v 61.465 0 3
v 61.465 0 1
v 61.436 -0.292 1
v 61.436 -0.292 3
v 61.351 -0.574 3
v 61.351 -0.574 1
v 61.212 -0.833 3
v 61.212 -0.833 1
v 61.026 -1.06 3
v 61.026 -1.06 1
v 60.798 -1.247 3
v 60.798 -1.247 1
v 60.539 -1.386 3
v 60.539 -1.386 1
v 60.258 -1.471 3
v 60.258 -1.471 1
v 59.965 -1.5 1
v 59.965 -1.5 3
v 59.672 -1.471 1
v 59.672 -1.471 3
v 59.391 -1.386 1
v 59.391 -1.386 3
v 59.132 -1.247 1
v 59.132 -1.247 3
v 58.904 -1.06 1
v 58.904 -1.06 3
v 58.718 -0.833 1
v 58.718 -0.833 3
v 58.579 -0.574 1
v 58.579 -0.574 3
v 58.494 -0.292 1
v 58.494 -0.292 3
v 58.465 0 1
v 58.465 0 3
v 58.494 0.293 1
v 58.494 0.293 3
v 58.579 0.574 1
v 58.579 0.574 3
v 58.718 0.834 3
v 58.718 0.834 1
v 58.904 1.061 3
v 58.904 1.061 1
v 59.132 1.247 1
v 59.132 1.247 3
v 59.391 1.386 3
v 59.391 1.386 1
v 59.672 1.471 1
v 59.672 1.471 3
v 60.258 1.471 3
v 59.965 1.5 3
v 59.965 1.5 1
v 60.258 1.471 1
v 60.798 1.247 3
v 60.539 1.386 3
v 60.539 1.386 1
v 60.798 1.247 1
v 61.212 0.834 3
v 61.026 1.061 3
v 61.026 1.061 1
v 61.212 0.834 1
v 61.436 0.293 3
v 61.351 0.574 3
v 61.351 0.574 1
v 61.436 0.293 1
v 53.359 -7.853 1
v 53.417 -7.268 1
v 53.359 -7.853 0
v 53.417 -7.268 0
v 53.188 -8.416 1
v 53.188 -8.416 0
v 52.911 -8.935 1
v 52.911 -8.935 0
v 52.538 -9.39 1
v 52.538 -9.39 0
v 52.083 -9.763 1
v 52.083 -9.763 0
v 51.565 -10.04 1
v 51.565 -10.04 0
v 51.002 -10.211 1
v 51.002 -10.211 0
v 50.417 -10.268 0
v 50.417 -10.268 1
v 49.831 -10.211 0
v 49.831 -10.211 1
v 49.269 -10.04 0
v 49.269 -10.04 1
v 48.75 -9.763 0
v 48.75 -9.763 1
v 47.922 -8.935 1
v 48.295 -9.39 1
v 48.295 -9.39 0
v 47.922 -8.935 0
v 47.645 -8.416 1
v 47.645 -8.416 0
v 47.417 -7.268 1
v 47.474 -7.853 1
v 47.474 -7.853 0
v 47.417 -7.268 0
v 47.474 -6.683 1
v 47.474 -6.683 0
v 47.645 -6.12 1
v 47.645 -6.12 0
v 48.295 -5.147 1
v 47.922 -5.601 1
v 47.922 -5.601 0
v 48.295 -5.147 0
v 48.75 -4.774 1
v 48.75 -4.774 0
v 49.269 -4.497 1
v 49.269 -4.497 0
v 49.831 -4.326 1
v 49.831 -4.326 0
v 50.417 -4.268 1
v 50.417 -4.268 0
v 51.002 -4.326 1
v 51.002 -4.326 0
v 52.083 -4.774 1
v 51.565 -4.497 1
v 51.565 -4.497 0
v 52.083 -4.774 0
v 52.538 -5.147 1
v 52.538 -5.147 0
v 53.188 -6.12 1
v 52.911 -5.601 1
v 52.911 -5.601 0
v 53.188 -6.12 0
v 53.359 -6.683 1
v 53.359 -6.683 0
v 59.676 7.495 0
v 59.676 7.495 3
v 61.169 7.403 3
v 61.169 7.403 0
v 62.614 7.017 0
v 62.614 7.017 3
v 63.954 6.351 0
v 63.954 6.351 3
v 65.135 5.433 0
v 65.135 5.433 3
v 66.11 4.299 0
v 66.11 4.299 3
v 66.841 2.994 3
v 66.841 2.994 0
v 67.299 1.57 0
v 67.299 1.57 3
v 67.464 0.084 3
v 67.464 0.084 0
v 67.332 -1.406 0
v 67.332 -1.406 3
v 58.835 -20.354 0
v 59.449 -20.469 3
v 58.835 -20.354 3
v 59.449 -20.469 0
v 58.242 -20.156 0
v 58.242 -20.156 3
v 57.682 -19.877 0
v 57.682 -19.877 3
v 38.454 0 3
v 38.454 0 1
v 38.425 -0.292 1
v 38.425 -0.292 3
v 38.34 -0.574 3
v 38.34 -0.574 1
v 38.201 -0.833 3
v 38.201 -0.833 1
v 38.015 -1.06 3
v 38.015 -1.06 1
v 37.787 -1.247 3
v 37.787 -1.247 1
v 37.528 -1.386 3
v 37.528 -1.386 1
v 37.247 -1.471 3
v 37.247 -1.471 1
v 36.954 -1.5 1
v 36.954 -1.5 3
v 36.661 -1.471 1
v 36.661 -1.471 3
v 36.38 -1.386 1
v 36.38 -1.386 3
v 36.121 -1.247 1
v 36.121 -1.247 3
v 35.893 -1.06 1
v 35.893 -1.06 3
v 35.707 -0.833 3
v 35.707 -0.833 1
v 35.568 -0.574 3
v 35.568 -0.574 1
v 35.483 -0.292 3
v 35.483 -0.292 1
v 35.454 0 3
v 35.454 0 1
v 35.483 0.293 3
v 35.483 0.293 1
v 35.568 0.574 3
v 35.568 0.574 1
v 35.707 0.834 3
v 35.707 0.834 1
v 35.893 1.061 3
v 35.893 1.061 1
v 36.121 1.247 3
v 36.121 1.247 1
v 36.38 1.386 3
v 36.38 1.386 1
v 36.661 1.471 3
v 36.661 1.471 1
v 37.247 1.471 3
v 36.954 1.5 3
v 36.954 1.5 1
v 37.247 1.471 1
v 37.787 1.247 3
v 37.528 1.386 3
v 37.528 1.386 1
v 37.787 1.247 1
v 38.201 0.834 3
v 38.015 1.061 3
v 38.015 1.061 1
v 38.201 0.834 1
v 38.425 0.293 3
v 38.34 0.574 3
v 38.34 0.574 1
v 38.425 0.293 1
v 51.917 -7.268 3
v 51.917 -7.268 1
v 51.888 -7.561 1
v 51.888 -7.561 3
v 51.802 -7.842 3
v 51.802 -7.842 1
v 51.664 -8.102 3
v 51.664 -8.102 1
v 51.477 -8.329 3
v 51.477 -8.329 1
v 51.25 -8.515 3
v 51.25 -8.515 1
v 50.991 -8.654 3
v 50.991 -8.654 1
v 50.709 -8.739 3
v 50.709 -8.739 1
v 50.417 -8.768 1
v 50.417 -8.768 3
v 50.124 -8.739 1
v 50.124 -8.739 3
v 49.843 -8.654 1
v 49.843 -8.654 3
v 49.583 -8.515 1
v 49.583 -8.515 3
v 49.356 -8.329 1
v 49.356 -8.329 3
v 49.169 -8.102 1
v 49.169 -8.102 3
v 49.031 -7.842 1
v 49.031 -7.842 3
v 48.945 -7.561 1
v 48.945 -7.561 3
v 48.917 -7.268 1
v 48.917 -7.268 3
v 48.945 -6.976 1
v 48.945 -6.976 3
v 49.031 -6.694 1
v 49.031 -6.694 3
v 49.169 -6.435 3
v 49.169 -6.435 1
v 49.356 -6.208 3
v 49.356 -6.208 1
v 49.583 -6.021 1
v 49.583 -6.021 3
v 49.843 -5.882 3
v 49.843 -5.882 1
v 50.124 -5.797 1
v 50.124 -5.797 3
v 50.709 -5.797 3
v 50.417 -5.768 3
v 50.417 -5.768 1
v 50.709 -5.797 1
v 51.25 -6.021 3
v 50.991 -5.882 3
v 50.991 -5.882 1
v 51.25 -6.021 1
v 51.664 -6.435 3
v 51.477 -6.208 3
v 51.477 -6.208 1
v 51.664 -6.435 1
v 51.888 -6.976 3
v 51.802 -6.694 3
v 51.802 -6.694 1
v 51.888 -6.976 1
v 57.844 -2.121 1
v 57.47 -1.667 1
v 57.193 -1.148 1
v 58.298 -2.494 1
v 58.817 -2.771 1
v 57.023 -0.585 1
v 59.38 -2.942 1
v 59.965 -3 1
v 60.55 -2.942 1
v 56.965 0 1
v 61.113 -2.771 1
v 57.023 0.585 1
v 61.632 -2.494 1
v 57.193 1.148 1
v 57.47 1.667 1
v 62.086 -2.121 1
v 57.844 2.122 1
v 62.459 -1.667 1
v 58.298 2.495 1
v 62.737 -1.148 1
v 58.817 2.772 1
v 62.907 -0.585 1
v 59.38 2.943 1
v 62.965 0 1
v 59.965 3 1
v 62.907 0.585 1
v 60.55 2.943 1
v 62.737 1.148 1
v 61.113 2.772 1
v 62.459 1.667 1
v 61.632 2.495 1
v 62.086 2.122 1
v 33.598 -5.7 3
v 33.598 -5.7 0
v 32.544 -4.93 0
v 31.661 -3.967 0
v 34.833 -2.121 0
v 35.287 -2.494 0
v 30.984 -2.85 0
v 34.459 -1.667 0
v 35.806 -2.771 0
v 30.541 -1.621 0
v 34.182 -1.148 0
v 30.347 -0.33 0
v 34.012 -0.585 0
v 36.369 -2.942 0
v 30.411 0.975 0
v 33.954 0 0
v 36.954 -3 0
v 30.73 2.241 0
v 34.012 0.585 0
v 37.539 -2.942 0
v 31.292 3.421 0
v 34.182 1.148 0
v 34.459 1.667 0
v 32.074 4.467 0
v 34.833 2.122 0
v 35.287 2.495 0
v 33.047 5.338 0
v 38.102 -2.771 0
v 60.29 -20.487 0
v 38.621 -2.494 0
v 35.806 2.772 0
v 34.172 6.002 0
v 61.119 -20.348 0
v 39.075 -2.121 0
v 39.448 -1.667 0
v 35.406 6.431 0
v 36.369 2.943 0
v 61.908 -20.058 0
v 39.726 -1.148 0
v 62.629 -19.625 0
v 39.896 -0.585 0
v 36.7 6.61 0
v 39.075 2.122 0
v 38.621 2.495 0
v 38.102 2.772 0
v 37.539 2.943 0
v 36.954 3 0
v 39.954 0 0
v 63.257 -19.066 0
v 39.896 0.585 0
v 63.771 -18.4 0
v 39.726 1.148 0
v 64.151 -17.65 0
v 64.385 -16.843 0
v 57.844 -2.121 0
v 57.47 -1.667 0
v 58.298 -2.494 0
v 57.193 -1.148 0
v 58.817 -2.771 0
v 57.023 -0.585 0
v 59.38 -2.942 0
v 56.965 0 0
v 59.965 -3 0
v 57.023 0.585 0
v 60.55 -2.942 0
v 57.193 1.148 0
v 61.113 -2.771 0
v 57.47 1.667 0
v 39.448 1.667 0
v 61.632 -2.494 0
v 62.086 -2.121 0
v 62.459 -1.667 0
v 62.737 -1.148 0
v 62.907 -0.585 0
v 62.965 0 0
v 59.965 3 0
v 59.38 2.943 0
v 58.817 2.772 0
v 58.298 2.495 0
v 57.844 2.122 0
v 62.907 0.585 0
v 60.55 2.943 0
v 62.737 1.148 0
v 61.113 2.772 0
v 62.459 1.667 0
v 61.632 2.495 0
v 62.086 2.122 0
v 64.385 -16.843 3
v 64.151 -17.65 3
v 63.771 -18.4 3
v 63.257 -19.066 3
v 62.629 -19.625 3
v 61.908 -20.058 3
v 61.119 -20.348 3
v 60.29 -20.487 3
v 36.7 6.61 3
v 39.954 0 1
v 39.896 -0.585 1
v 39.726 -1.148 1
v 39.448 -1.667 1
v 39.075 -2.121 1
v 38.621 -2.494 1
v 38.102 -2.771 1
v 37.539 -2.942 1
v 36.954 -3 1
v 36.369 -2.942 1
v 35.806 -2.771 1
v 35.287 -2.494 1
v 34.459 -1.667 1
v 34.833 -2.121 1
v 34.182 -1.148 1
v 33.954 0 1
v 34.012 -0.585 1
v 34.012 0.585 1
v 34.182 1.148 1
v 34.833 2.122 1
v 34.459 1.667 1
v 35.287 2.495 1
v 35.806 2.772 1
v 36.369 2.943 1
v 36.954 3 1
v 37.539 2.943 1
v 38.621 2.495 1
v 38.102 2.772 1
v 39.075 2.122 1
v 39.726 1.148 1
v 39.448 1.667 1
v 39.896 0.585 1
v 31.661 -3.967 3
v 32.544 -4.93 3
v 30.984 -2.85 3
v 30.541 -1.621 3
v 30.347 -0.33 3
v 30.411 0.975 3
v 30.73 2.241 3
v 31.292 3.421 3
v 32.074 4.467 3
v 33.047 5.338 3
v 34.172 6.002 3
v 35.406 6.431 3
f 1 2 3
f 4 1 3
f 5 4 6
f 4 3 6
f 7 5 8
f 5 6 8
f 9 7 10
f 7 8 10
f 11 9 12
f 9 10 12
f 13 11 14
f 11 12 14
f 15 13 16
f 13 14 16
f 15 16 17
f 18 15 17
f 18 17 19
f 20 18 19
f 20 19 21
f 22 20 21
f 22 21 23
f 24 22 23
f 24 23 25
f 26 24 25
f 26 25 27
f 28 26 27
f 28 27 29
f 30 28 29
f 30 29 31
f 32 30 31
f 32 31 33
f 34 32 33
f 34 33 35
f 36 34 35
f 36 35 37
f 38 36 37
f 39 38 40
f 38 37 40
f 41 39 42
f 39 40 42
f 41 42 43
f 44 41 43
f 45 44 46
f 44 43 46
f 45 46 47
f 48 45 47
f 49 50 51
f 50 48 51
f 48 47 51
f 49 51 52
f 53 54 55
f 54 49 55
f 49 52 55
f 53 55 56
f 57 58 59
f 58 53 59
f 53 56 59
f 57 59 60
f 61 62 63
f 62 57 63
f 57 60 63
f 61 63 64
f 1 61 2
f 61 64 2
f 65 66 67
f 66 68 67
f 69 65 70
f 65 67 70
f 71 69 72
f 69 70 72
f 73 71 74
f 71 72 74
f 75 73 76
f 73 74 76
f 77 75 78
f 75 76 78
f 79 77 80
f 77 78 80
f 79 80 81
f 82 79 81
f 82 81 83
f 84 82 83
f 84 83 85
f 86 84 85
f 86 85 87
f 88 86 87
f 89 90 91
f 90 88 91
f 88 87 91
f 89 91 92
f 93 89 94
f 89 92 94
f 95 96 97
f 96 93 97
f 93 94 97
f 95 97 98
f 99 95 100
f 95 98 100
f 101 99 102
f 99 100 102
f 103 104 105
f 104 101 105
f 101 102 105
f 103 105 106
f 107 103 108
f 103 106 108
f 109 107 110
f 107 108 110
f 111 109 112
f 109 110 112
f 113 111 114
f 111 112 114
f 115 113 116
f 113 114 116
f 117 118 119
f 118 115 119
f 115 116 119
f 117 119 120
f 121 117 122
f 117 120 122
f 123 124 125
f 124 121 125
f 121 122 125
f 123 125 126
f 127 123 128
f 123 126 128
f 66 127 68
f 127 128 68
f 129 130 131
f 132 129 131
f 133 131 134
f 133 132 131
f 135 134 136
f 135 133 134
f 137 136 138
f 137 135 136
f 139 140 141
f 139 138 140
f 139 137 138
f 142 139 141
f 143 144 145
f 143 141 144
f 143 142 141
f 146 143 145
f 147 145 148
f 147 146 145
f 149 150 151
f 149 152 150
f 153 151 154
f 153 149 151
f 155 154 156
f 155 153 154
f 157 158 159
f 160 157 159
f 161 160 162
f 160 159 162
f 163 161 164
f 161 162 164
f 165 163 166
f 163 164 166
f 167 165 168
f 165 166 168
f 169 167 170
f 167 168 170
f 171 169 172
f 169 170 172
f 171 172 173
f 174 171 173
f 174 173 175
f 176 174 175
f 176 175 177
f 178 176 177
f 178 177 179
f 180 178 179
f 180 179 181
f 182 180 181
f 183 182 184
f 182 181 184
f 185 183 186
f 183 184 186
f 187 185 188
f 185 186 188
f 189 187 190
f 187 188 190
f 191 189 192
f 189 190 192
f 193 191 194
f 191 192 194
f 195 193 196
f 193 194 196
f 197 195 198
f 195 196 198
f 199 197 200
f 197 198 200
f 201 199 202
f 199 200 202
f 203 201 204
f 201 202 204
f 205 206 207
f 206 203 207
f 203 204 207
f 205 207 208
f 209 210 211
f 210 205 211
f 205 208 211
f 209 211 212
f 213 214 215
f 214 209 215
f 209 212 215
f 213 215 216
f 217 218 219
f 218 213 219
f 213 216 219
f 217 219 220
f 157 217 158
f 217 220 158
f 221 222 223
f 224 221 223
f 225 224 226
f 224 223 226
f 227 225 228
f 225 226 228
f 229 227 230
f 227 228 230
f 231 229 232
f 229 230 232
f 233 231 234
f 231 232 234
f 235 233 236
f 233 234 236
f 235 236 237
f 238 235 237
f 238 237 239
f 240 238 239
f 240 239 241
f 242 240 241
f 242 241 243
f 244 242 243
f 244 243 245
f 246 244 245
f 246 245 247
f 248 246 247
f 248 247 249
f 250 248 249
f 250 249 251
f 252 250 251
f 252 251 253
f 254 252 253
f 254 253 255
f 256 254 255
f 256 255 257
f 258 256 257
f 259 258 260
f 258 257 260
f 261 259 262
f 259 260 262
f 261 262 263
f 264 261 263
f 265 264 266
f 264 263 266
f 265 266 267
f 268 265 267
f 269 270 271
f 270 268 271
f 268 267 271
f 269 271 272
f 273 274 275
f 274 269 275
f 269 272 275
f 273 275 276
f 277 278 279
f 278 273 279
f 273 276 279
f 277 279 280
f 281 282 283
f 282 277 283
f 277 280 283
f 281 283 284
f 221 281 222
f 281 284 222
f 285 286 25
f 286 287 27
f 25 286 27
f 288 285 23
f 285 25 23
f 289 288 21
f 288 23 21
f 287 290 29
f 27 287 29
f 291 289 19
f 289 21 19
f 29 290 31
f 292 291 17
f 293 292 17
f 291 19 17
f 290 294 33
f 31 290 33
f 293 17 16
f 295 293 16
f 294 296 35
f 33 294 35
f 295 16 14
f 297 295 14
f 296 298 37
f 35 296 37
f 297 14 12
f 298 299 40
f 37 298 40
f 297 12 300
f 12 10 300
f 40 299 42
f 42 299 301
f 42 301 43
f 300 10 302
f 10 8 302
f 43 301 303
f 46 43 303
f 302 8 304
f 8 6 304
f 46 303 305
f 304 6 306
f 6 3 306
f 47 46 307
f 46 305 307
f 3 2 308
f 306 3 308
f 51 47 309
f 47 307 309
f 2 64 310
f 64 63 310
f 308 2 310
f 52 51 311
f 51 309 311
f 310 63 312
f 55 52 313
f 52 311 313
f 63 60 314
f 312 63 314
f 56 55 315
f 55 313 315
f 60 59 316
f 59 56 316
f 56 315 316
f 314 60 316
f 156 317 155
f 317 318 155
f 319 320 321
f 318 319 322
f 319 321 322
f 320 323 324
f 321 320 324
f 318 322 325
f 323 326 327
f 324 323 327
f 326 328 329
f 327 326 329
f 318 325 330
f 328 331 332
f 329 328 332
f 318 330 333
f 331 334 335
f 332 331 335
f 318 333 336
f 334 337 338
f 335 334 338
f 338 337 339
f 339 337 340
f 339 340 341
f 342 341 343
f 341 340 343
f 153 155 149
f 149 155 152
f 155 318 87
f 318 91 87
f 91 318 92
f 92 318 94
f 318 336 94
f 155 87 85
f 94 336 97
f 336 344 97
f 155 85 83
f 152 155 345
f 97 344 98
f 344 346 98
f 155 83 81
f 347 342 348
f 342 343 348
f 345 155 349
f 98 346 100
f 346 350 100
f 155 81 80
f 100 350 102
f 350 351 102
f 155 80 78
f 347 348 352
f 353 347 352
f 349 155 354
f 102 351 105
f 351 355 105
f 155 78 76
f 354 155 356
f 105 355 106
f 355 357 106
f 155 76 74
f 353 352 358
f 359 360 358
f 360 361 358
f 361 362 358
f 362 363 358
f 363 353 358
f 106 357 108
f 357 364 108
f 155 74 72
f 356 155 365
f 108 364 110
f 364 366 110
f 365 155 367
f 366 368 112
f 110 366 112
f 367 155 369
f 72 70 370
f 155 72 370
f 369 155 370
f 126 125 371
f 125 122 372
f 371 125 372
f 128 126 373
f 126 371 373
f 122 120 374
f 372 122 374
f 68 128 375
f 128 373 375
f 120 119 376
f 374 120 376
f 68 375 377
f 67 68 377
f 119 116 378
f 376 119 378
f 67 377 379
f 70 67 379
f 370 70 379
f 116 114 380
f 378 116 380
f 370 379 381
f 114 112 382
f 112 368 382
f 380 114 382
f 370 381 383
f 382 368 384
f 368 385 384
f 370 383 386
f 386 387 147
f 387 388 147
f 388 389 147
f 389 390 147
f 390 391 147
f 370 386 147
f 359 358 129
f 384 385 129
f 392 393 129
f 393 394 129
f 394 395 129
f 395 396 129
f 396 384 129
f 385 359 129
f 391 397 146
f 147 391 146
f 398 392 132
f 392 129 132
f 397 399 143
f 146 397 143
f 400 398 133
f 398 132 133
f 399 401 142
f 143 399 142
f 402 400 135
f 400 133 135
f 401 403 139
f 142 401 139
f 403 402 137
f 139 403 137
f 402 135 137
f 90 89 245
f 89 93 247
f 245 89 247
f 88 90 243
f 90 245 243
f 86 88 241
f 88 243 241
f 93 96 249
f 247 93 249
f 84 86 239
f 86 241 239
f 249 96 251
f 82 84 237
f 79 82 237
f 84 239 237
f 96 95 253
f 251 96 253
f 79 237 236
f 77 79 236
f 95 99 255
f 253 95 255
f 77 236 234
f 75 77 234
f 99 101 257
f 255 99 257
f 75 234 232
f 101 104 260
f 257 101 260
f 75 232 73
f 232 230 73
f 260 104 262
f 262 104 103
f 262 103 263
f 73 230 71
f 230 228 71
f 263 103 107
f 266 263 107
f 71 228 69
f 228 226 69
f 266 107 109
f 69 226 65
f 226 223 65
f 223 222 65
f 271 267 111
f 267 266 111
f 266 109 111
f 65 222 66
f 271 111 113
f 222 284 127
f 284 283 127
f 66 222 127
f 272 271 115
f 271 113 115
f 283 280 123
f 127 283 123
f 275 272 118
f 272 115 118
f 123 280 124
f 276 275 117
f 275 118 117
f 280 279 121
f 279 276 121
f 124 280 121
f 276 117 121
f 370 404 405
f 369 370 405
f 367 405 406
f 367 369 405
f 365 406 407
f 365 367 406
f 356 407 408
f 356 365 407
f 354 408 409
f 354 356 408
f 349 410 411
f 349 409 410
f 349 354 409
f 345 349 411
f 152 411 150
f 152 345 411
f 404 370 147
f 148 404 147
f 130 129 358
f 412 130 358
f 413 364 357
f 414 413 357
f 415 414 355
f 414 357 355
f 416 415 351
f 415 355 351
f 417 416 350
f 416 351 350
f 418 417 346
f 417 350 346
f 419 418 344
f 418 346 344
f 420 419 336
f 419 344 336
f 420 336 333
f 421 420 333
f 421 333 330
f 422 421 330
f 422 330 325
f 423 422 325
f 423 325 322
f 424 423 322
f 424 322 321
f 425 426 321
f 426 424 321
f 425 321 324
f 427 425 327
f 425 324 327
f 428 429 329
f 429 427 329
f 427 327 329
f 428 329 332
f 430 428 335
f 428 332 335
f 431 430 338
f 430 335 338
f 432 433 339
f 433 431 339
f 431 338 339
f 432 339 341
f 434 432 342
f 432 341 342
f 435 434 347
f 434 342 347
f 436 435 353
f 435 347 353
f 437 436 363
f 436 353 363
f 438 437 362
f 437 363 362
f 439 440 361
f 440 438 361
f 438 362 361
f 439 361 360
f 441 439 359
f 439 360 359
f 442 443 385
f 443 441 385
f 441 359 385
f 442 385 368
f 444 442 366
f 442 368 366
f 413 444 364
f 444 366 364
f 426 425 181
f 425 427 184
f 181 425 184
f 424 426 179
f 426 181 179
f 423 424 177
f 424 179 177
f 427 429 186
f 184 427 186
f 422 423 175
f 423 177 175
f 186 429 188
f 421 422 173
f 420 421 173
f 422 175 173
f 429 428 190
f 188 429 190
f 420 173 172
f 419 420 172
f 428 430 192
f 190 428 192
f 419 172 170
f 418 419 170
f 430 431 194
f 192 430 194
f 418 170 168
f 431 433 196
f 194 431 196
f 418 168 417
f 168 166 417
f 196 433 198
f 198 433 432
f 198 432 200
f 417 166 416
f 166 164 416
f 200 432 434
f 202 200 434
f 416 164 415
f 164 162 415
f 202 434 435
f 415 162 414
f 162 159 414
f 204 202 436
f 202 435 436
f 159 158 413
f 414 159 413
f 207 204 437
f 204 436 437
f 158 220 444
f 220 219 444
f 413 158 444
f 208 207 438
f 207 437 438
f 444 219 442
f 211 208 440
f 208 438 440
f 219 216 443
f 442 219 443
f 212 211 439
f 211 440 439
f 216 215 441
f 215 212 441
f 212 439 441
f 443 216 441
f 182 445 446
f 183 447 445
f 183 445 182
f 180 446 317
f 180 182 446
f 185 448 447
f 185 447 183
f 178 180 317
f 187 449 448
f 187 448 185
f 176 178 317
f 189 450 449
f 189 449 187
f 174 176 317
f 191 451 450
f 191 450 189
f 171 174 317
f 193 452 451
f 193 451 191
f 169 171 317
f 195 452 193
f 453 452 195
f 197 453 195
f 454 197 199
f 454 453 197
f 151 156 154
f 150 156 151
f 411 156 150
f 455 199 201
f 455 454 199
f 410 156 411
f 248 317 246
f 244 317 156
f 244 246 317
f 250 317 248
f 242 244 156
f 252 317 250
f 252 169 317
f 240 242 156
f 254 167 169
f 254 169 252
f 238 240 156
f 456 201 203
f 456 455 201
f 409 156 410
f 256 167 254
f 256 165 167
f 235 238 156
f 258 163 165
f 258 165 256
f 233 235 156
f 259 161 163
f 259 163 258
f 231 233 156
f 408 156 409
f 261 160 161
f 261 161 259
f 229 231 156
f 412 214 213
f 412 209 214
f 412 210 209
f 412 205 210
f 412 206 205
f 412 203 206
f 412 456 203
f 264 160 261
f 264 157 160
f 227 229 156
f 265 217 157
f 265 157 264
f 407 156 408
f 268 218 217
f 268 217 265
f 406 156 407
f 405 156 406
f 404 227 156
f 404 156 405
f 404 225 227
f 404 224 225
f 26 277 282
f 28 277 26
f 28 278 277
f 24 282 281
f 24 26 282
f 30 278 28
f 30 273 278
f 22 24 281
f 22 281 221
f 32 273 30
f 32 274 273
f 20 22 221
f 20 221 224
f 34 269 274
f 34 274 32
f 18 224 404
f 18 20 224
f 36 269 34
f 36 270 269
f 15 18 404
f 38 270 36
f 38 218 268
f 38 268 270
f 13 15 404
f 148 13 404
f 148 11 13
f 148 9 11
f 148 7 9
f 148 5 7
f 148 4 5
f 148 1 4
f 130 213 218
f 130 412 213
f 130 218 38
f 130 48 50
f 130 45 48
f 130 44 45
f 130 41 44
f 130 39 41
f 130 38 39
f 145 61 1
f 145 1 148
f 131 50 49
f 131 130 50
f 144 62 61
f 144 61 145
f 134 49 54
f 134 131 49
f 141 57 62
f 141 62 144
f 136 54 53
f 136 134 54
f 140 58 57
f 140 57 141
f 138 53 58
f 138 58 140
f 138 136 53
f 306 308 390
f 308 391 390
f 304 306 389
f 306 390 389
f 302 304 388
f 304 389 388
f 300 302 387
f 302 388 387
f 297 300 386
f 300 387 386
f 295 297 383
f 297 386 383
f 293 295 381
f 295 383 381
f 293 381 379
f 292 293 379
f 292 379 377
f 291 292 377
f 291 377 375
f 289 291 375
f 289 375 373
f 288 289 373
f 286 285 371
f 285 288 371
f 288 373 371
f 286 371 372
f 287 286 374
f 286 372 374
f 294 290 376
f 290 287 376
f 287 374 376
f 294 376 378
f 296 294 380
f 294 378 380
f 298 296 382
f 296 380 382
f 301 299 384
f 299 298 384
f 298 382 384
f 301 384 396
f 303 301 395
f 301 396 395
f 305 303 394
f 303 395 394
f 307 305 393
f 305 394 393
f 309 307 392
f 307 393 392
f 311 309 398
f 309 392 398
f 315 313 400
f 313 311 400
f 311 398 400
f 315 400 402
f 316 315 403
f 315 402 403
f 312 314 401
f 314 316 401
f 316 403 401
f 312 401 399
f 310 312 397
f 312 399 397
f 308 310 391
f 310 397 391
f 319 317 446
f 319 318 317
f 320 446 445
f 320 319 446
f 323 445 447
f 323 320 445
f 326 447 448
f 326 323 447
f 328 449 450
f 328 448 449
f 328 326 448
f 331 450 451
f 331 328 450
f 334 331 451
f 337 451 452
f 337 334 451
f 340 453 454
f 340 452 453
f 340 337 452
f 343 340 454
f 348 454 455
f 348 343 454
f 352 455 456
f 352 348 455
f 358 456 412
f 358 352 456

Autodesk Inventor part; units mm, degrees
ref_plane "YZ Plane" through (0, 0, 0) normal (1, 0, 0) x (0, 1, 0)
ref_plane "XZ Plane" through (0, 0, 0) normal (0, 1, 0) x (-1, 0, 0)
ref_plane "XY Plane" through (0, 0, 0) normal (0, 0, 1) x (1, 0, 0)
sketch "スケッチ1" plane through (0, 0, 0) normal (0, 0, 1) x (1, 0, 0)
  circle A0 centre (59.9649, 0.0002) radius 1.5
  circle A1 centre (9.9649, 0.0002) radius 2
  circle A2 centre (-5.0351, 0.0002) radius 2
  circle A3 centre (50.4166, -7.2682) radius 1.5
  circle A4 centre (7.9649, -9.9998) radius 1.5
  arc A5 (-5.2274, 4.9965) -> (-7.9614, -4.054) centre (-5.0351, 0.0002) ccw
  line L0 (-7.9614, -4.054) -> (5.3313, -13.6486)
  arc A6 (5.3313, -13.6486) -> (7.4492, -14.4702) centre (7.9649, -9.9998) ccw
  line L1 (7.4492, -14.4702) -> (59.4492, -20.4691)
  arc A7 (59.4492, -20.4691) -> (64.3851, -16.8426) centre (59.9649, -15.9988) ccw
  line L2 (64.3851, -16.8426) -> (67.3319, -1.4061)
  arc A8 (67.3319, -1.4061) -> (59.6765, 7.4946) centre (59.9649, 0.0002) ccw
  line L3 (59.6765, 7.4946) -> (-5.2274, 4.9965)
  circle A9 centre (59.9649, 0.0002) radius 3
  circle A10 centre (50.4166, -7.2682) radius 3
  circle A11 centre (7.9649, -9.9998) radius 3
  circle A12 centre (36.9539, 0.0002) radius 1.5
  circle A13 centre (36.9539, 0.0002) radius 3
  arc A14 (36.6995, 6.6103) -> (33.5984, -5.7005) centre (36.9539, 0.0002) ccw
  line L4 (7.4492, -14.4702) -> (59.4492, -20.4691)
  arc A15 (57.6822, -19.8768) -> (59.4492, -20.4691) centre (59.9649, -15.9988) ccw
  line L5 (33.5984, -5.7005) -> (57.6822, -19.8768)
  line L6 (59.6765, 7.4946) -> (-5.2274, 4.9965)
  point P0 (0, 0)
  point P1 (0, 0)
  dimension "d0" = 6
  dimension "d1" = 6
  dimension "d2" = 6
  dimension "d3" = 6
extrude "押し出し1" add sketch "スケッチ1" along normal blind 3 contours L3 A8 L2 A7 A15 L5 A14 | A9 | A10 | A13
extrude "押し出し2" cut sketch "スケッチ1" along normal blind 1 contours A9 | A10 | A13
sketch "スケッチ2" plane through (0, 0, 0) normal (0, 0, -1) x (-1, 0, 0)
  circle A0 centre (-59.9649, 0.0002) radius 3 projected
  circle A1 centre (-50.4166, -7.2682) radius 3 projected
  circle A2 centre (-36.9539, 0.0002) radius 3 projected
  line L0 (-59.6765, 7.4946) -> (-36.6995, 6.6103) projected
  arc A3 (-59.6765, 7.4946) -> (-67.3319, -1.4061) centre (-59.9649, 0.0002) ccw projected
  line L1 (-64.3851, -16.8426) -> (-67.3319, -1.4061) projected
  arc A4 (-64.3851, -16.8426) -> (-57.6822, -19.8768) centre (-59.9649, -15.9988) ccw projected
  line L2 (-33.5984, -5.7005) -> (-57.6822, -19.8768) projected
  arc A5 (-33.5984, -5.7005) -> (-36.6995, 6.6103) centre (-36.9539, 0.0002) ccw projected
  circle A6 centre (-59.9649, 0.0002) radius 1.5 projected
  circle A7 centre (-50.4166, -7.2682) radius 1.5 projected
  circle A8 centre (-36.9539, 0.0002) radius 1.5 projected
  point P0 (0, 0)
properties part number "ツイン抑え" material "ポリカーボネート、クリア"
